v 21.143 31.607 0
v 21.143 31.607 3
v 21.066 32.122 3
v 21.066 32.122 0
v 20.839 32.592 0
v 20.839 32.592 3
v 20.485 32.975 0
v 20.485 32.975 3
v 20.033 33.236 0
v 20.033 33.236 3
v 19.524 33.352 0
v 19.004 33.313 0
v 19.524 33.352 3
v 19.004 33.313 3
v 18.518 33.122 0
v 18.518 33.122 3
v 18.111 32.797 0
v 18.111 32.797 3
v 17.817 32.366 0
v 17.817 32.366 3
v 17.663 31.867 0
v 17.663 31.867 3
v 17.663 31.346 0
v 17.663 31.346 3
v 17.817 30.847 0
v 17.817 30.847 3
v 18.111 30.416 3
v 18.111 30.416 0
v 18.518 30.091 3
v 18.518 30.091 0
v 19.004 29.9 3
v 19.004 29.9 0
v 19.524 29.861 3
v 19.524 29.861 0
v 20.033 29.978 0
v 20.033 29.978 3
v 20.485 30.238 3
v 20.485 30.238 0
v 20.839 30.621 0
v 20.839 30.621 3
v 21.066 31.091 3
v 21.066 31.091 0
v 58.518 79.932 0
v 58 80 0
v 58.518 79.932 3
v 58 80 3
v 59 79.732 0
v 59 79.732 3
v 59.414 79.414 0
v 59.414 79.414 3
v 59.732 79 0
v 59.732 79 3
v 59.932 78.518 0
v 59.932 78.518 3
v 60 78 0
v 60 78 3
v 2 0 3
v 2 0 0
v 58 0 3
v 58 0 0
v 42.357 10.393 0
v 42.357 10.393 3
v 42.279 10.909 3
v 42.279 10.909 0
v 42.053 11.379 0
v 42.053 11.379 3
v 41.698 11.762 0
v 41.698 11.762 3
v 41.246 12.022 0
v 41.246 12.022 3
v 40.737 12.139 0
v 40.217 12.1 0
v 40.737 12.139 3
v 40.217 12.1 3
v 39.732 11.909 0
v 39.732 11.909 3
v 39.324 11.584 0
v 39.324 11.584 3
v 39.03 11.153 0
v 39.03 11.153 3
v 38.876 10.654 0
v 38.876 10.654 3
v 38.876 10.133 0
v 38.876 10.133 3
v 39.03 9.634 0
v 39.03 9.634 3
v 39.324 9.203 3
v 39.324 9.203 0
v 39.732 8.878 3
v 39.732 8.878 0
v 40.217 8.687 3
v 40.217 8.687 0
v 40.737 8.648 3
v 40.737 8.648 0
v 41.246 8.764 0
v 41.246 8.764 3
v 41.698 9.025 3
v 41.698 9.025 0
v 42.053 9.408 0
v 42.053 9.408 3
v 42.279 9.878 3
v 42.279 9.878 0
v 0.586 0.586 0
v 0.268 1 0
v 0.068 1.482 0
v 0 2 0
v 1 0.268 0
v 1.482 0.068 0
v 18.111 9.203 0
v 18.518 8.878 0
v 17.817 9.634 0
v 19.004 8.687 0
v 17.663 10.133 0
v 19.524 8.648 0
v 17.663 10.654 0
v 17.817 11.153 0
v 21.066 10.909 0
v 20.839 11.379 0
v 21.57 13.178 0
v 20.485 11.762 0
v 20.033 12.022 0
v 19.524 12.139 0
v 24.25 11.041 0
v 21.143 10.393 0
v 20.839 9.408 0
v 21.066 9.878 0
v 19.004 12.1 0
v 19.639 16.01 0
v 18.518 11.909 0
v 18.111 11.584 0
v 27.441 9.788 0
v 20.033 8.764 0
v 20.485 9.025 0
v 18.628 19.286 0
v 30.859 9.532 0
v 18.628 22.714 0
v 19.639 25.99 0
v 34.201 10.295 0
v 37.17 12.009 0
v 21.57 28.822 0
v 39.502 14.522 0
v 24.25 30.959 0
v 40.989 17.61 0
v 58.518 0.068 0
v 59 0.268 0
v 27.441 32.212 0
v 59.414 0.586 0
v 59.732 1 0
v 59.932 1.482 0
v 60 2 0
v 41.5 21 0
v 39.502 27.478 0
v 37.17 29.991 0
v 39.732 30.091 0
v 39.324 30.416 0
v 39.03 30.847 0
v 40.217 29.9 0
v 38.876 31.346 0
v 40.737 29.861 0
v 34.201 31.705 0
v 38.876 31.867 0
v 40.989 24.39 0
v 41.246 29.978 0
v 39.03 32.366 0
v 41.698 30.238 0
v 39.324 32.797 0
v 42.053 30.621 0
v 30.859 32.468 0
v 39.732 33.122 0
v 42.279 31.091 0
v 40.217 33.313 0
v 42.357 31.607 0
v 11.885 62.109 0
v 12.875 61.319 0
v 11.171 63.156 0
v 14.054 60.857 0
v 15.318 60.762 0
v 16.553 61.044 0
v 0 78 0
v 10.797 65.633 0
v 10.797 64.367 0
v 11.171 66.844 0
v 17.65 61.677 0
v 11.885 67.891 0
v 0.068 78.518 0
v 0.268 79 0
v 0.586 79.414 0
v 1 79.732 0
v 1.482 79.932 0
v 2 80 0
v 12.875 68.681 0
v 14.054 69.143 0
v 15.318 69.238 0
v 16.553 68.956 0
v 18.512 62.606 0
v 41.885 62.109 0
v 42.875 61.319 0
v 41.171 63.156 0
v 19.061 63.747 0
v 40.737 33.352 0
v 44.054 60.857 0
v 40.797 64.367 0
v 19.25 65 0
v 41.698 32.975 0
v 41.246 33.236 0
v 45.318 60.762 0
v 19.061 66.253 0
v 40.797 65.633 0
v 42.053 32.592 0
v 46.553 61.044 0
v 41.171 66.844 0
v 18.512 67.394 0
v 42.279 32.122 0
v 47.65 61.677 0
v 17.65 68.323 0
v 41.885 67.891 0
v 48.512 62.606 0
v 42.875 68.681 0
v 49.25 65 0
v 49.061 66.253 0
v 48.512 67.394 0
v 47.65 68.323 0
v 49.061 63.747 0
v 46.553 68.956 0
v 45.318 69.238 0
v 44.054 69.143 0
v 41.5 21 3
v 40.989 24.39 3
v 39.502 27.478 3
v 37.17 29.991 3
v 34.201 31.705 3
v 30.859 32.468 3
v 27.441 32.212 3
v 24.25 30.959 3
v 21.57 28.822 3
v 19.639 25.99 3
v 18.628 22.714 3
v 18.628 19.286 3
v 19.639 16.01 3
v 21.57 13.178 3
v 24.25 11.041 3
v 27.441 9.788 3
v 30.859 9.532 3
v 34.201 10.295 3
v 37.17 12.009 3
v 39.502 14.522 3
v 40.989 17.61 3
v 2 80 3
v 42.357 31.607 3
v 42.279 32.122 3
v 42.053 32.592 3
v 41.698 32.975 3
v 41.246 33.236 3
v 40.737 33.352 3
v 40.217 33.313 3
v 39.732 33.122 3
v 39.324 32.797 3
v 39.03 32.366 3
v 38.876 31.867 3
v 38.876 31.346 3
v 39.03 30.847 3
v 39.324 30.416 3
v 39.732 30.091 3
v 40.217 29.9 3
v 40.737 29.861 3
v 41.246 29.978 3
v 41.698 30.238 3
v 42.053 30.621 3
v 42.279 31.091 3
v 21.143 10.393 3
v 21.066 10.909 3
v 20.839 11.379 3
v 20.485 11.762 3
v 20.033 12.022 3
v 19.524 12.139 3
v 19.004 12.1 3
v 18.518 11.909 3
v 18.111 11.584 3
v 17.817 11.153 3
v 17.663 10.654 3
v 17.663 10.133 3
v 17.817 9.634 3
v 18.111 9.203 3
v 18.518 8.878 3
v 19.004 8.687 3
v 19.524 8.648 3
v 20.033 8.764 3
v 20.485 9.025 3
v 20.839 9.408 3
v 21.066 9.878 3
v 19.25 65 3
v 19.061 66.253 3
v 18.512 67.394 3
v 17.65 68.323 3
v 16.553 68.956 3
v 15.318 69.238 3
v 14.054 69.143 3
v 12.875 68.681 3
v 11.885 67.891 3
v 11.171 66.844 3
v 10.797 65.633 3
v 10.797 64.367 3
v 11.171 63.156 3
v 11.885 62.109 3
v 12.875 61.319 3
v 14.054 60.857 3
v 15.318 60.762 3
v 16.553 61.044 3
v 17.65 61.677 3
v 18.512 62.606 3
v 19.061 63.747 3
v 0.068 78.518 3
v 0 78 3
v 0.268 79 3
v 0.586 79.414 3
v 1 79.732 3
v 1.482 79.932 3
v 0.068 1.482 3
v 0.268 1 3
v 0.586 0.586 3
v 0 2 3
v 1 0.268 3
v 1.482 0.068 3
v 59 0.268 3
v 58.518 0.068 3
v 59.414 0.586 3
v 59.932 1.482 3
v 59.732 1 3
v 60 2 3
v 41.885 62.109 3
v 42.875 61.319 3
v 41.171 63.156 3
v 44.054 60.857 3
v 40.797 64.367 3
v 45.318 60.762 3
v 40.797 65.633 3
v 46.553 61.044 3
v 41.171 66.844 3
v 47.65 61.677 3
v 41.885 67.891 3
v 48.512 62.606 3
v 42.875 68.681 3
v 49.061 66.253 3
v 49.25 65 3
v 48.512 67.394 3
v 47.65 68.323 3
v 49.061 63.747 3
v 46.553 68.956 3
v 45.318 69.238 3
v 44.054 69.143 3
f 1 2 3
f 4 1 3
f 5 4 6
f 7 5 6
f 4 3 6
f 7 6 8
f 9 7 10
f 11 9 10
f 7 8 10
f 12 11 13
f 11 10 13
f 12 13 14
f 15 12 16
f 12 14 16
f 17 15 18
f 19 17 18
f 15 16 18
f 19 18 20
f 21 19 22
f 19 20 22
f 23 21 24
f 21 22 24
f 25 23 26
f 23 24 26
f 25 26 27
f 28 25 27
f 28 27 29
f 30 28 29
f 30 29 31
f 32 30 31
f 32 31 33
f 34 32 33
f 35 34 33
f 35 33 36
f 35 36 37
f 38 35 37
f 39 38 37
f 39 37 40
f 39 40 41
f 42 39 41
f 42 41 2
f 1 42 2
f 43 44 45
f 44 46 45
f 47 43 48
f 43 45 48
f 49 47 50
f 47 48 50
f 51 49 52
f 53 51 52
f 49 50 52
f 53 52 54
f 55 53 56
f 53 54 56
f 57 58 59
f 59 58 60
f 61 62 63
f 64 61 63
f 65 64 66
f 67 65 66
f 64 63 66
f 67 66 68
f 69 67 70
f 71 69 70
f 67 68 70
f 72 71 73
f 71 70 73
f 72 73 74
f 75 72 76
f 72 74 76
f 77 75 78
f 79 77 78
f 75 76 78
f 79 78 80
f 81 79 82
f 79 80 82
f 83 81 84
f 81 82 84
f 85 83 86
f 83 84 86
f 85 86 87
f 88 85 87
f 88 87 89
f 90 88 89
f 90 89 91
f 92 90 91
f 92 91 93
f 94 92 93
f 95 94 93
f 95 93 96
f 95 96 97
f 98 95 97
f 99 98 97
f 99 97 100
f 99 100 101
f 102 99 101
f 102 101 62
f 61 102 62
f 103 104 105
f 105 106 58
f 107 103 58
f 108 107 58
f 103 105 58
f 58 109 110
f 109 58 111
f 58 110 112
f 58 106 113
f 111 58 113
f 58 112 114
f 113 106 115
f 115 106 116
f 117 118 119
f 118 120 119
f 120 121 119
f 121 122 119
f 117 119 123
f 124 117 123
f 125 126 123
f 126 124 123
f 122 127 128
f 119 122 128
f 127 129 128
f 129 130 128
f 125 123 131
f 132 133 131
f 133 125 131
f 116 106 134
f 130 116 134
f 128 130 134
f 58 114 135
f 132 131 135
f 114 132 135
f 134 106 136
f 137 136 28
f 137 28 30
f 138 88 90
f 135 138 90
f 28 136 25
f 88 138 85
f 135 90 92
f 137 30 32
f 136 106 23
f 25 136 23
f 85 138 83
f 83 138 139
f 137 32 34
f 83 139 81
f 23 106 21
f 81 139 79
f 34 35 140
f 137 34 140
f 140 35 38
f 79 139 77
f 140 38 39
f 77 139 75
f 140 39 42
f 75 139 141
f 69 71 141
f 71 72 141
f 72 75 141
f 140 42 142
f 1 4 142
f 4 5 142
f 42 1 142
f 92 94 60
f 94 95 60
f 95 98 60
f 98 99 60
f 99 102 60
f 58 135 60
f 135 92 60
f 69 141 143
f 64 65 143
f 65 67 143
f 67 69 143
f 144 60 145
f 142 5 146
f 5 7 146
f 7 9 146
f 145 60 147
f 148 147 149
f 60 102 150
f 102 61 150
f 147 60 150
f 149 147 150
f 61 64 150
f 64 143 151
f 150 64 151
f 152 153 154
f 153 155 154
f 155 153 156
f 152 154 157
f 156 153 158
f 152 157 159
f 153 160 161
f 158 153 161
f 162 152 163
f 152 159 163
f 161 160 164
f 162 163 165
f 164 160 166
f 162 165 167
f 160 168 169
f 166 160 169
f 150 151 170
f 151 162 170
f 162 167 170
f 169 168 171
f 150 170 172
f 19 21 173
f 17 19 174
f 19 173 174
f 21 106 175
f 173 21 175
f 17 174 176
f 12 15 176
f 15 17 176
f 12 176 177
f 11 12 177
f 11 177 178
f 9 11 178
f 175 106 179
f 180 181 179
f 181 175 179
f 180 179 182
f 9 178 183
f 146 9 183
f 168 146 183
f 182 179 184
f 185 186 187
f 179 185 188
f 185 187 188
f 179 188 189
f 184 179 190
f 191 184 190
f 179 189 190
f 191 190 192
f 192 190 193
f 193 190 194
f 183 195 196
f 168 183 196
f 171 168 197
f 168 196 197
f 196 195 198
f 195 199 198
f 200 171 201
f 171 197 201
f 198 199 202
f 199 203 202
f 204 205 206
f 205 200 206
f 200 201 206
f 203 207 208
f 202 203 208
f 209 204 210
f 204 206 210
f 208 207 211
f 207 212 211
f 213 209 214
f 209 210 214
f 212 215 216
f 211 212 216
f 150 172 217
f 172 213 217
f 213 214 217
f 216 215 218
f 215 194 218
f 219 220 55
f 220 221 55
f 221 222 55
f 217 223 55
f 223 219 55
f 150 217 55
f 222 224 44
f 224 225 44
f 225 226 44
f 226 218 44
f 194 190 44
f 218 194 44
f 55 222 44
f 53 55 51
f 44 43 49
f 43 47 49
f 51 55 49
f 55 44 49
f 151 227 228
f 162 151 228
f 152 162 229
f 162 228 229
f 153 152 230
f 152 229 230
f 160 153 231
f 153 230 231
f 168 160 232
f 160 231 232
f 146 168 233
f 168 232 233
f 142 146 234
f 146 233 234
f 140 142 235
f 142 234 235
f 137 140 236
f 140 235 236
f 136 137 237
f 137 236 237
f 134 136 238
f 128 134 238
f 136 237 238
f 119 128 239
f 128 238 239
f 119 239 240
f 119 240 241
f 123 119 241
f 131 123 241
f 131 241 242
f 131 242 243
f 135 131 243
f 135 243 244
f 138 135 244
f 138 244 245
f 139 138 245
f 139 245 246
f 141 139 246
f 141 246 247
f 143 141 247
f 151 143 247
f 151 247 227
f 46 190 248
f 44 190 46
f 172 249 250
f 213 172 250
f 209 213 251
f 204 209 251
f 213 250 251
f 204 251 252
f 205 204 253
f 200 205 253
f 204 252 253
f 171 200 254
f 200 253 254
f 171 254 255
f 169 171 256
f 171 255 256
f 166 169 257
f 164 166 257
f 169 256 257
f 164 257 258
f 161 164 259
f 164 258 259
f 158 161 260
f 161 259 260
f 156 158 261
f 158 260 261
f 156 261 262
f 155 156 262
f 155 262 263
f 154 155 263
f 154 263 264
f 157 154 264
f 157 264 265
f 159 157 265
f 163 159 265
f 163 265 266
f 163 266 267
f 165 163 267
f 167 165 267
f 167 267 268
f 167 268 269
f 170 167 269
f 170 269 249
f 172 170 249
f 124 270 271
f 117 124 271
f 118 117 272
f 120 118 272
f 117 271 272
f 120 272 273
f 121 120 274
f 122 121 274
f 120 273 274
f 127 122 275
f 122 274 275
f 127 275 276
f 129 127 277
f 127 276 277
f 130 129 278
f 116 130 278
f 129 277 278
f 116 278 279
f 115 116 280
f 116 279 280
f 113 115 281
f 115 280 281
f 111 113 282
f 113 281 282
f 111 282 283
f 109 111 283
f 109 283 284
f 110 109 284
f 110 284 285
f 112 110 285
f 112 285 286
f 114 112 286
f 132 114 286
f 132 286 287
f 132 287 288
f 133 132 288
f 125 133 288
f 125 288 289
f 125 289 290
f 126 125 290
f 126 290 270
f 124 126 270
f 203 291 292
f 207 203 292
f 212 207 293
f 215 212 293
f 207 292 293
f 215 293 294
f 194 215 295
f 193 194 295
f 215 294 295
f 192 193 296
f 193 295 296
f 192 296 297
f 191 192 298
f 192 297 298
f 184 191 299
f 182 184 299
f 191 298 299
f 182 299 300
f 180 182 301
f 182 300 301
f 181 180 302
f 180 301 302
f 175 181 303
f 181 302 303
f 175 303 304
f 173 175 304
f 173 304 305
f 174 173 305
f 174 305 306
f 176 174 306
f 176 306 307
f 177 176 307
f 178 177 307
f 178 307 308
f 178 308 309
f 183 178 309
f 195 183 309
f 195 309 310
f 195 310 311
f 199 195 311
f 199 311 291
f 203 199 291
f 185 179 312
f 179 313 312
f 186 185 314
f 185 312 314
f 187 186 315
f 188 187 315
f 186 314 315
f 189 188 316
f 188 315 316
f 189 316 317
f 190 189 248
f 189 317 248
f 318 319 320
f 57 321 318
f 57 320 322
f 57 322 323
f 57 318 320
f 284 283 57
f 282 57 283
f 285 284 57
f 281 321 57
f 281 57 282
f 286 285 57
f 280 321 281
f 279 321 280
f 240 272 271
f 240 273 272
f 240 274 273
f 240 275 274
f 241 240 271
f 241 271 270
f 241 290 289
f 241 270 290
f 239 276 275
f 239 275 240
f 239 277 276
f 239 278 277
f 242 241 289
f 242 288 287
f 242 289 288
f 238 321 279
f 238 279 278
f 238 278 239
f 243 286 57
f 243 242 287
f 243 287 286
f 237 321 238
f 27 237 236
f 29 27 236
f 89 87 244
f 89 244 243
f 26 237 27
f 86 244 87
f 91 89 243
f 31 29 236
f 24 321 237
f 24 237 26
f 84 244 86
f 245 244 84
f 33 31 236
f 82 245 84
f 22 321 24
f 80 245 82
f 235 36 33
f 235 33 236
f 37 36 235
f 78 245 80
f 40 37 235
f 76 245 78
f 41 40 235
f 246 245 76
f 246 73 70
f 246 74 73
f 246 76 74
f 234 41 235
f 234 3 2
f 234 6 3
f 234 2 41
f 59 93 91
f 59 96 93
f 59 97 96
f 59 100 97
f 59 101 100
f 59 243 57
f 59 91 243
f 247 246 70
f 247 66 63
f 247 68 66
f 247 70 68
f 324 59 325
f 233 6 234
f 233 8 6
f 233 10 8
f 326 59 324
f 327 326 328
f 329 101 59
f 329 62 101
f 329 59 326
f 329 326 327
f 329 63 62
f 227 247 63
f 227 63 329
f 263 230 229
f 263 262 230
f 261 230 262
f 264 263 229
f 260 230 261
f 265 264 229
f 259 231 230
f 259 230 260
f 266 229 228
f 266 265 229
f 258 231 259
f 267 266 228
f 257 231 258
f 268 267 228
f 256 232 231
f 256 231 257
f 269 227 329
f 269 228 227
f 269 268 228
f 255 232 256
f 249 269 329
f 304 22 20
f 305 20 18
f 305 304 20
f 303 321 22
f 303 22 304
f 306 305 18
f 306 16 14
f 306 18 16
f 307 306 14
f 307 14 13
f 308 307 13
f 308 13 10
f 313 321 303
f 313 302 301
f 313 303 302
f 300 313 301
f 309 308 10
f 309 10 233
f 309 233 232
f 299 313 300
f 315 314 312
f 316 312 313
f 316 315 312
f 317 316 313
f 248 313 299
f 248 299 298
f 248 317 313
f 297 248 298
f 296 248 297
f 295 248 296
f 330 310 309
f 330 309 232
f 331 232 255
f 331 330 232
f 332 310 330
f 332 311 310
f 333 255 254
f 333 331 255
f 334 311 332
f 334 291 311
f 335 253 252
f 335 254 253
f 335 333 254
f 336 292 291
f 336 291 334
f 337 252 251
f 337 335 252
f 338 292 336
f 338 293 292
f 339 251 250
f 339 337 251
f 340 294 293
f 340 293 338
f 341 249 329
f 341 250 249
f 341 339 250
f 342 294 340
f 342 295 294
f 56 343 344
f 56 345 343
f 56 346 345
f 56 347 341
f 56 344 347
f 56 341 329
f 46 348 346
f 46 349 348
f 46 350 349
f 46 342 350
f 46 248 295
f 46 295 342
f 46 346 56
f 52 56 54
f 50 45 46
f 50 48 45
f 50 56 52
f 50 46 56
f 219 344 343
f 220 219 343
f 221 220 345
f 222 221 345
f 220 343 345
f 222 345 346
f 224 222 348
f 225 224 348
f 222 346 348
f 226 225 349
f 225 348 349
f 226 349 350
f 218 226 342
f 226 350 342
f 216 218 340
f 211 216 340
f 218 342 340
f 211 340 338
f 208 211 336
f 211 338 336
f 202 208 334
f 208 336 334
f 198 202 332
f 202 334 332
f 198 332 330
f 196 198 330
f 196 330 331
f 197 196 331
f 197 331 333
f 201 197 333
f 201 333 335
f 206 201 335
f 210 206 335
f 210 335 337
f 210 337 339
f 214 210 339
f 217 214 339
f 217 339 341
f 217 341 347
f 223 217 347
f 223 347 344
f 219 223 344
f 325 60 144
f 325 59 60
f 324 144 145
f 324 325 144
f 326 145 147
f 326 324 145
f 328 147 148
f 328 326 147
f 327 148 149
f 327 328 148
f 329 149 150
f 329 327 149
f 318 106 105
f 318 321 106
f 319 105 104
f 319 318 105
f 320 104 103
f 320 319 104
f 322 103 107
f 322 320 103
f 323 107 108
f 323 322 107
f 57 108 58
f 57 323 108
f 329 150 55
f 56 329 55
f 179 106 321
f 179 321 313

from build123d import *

# Parameters (mm, degrees)
SKETCH_1_W          = 60
SKETCH_1_H          = 80
EXTRUDE_1_DEPTH     = 3
SKETCH_2_R          = 11.5
SKETCH_2_R_2        = 1.75
SKETCH_2_R_3        = 4.25
CUT_EXTRUDE_1_DEPTH = 4
FILLET_1_R          = 2


with BuildPart() as part:
    # 草图1 → 凸台-拉伸1 (new body)
    with BuildSketch(Plane.XY):
        with Locations((30, 40)):
            Rectangle(SKETCH_1_W, SKETCH_1_H)
    extrude(amount=EXTRUDE_1_DEPTH)

    # 草图2 → 切除-拉伸1 (cut, through all)
    with BuildSketch(Plane.XY.offset(3)):
        with Locations((30, 21)):
            Circle(SKETCH_2_R)
        with Locations((19.393398282, 31.606601718)):
            Circle(SKETCH_2_R_2)
        with Locations((40.606601718, 31.606601718)):
            Circle(SKETCH_2_R_2)
        with Locations((40.606601718, 10.393398282)):
            Circle(SKETCH_2_R_2)
        with Locations((19.393398282, 10.393398282)):
            Circle(SKETCH_2_R_2)
        with Locations((15, 65)):
            Circle(SKETCH_2_R_3)
        with Locations((45, 65)):
            Circle(SKETCH_2_R_3)
    extrude(amount=-CUT_EXTRUDE_1_DEPTH, mode=Mode.SUBTRACT)

    # 圆角1
    fillet_1_edges = [part.edges().sort_by_distance(p)[0] for p in [
        (0, 80, 1.5),
        (60, 80, 1.5),
        (60, 0, 1.5),
        (0, 0, 1.5),
    ]]
    fillet(fillet_1_edges, radius=FILLET_1_R)


solid = part.part
